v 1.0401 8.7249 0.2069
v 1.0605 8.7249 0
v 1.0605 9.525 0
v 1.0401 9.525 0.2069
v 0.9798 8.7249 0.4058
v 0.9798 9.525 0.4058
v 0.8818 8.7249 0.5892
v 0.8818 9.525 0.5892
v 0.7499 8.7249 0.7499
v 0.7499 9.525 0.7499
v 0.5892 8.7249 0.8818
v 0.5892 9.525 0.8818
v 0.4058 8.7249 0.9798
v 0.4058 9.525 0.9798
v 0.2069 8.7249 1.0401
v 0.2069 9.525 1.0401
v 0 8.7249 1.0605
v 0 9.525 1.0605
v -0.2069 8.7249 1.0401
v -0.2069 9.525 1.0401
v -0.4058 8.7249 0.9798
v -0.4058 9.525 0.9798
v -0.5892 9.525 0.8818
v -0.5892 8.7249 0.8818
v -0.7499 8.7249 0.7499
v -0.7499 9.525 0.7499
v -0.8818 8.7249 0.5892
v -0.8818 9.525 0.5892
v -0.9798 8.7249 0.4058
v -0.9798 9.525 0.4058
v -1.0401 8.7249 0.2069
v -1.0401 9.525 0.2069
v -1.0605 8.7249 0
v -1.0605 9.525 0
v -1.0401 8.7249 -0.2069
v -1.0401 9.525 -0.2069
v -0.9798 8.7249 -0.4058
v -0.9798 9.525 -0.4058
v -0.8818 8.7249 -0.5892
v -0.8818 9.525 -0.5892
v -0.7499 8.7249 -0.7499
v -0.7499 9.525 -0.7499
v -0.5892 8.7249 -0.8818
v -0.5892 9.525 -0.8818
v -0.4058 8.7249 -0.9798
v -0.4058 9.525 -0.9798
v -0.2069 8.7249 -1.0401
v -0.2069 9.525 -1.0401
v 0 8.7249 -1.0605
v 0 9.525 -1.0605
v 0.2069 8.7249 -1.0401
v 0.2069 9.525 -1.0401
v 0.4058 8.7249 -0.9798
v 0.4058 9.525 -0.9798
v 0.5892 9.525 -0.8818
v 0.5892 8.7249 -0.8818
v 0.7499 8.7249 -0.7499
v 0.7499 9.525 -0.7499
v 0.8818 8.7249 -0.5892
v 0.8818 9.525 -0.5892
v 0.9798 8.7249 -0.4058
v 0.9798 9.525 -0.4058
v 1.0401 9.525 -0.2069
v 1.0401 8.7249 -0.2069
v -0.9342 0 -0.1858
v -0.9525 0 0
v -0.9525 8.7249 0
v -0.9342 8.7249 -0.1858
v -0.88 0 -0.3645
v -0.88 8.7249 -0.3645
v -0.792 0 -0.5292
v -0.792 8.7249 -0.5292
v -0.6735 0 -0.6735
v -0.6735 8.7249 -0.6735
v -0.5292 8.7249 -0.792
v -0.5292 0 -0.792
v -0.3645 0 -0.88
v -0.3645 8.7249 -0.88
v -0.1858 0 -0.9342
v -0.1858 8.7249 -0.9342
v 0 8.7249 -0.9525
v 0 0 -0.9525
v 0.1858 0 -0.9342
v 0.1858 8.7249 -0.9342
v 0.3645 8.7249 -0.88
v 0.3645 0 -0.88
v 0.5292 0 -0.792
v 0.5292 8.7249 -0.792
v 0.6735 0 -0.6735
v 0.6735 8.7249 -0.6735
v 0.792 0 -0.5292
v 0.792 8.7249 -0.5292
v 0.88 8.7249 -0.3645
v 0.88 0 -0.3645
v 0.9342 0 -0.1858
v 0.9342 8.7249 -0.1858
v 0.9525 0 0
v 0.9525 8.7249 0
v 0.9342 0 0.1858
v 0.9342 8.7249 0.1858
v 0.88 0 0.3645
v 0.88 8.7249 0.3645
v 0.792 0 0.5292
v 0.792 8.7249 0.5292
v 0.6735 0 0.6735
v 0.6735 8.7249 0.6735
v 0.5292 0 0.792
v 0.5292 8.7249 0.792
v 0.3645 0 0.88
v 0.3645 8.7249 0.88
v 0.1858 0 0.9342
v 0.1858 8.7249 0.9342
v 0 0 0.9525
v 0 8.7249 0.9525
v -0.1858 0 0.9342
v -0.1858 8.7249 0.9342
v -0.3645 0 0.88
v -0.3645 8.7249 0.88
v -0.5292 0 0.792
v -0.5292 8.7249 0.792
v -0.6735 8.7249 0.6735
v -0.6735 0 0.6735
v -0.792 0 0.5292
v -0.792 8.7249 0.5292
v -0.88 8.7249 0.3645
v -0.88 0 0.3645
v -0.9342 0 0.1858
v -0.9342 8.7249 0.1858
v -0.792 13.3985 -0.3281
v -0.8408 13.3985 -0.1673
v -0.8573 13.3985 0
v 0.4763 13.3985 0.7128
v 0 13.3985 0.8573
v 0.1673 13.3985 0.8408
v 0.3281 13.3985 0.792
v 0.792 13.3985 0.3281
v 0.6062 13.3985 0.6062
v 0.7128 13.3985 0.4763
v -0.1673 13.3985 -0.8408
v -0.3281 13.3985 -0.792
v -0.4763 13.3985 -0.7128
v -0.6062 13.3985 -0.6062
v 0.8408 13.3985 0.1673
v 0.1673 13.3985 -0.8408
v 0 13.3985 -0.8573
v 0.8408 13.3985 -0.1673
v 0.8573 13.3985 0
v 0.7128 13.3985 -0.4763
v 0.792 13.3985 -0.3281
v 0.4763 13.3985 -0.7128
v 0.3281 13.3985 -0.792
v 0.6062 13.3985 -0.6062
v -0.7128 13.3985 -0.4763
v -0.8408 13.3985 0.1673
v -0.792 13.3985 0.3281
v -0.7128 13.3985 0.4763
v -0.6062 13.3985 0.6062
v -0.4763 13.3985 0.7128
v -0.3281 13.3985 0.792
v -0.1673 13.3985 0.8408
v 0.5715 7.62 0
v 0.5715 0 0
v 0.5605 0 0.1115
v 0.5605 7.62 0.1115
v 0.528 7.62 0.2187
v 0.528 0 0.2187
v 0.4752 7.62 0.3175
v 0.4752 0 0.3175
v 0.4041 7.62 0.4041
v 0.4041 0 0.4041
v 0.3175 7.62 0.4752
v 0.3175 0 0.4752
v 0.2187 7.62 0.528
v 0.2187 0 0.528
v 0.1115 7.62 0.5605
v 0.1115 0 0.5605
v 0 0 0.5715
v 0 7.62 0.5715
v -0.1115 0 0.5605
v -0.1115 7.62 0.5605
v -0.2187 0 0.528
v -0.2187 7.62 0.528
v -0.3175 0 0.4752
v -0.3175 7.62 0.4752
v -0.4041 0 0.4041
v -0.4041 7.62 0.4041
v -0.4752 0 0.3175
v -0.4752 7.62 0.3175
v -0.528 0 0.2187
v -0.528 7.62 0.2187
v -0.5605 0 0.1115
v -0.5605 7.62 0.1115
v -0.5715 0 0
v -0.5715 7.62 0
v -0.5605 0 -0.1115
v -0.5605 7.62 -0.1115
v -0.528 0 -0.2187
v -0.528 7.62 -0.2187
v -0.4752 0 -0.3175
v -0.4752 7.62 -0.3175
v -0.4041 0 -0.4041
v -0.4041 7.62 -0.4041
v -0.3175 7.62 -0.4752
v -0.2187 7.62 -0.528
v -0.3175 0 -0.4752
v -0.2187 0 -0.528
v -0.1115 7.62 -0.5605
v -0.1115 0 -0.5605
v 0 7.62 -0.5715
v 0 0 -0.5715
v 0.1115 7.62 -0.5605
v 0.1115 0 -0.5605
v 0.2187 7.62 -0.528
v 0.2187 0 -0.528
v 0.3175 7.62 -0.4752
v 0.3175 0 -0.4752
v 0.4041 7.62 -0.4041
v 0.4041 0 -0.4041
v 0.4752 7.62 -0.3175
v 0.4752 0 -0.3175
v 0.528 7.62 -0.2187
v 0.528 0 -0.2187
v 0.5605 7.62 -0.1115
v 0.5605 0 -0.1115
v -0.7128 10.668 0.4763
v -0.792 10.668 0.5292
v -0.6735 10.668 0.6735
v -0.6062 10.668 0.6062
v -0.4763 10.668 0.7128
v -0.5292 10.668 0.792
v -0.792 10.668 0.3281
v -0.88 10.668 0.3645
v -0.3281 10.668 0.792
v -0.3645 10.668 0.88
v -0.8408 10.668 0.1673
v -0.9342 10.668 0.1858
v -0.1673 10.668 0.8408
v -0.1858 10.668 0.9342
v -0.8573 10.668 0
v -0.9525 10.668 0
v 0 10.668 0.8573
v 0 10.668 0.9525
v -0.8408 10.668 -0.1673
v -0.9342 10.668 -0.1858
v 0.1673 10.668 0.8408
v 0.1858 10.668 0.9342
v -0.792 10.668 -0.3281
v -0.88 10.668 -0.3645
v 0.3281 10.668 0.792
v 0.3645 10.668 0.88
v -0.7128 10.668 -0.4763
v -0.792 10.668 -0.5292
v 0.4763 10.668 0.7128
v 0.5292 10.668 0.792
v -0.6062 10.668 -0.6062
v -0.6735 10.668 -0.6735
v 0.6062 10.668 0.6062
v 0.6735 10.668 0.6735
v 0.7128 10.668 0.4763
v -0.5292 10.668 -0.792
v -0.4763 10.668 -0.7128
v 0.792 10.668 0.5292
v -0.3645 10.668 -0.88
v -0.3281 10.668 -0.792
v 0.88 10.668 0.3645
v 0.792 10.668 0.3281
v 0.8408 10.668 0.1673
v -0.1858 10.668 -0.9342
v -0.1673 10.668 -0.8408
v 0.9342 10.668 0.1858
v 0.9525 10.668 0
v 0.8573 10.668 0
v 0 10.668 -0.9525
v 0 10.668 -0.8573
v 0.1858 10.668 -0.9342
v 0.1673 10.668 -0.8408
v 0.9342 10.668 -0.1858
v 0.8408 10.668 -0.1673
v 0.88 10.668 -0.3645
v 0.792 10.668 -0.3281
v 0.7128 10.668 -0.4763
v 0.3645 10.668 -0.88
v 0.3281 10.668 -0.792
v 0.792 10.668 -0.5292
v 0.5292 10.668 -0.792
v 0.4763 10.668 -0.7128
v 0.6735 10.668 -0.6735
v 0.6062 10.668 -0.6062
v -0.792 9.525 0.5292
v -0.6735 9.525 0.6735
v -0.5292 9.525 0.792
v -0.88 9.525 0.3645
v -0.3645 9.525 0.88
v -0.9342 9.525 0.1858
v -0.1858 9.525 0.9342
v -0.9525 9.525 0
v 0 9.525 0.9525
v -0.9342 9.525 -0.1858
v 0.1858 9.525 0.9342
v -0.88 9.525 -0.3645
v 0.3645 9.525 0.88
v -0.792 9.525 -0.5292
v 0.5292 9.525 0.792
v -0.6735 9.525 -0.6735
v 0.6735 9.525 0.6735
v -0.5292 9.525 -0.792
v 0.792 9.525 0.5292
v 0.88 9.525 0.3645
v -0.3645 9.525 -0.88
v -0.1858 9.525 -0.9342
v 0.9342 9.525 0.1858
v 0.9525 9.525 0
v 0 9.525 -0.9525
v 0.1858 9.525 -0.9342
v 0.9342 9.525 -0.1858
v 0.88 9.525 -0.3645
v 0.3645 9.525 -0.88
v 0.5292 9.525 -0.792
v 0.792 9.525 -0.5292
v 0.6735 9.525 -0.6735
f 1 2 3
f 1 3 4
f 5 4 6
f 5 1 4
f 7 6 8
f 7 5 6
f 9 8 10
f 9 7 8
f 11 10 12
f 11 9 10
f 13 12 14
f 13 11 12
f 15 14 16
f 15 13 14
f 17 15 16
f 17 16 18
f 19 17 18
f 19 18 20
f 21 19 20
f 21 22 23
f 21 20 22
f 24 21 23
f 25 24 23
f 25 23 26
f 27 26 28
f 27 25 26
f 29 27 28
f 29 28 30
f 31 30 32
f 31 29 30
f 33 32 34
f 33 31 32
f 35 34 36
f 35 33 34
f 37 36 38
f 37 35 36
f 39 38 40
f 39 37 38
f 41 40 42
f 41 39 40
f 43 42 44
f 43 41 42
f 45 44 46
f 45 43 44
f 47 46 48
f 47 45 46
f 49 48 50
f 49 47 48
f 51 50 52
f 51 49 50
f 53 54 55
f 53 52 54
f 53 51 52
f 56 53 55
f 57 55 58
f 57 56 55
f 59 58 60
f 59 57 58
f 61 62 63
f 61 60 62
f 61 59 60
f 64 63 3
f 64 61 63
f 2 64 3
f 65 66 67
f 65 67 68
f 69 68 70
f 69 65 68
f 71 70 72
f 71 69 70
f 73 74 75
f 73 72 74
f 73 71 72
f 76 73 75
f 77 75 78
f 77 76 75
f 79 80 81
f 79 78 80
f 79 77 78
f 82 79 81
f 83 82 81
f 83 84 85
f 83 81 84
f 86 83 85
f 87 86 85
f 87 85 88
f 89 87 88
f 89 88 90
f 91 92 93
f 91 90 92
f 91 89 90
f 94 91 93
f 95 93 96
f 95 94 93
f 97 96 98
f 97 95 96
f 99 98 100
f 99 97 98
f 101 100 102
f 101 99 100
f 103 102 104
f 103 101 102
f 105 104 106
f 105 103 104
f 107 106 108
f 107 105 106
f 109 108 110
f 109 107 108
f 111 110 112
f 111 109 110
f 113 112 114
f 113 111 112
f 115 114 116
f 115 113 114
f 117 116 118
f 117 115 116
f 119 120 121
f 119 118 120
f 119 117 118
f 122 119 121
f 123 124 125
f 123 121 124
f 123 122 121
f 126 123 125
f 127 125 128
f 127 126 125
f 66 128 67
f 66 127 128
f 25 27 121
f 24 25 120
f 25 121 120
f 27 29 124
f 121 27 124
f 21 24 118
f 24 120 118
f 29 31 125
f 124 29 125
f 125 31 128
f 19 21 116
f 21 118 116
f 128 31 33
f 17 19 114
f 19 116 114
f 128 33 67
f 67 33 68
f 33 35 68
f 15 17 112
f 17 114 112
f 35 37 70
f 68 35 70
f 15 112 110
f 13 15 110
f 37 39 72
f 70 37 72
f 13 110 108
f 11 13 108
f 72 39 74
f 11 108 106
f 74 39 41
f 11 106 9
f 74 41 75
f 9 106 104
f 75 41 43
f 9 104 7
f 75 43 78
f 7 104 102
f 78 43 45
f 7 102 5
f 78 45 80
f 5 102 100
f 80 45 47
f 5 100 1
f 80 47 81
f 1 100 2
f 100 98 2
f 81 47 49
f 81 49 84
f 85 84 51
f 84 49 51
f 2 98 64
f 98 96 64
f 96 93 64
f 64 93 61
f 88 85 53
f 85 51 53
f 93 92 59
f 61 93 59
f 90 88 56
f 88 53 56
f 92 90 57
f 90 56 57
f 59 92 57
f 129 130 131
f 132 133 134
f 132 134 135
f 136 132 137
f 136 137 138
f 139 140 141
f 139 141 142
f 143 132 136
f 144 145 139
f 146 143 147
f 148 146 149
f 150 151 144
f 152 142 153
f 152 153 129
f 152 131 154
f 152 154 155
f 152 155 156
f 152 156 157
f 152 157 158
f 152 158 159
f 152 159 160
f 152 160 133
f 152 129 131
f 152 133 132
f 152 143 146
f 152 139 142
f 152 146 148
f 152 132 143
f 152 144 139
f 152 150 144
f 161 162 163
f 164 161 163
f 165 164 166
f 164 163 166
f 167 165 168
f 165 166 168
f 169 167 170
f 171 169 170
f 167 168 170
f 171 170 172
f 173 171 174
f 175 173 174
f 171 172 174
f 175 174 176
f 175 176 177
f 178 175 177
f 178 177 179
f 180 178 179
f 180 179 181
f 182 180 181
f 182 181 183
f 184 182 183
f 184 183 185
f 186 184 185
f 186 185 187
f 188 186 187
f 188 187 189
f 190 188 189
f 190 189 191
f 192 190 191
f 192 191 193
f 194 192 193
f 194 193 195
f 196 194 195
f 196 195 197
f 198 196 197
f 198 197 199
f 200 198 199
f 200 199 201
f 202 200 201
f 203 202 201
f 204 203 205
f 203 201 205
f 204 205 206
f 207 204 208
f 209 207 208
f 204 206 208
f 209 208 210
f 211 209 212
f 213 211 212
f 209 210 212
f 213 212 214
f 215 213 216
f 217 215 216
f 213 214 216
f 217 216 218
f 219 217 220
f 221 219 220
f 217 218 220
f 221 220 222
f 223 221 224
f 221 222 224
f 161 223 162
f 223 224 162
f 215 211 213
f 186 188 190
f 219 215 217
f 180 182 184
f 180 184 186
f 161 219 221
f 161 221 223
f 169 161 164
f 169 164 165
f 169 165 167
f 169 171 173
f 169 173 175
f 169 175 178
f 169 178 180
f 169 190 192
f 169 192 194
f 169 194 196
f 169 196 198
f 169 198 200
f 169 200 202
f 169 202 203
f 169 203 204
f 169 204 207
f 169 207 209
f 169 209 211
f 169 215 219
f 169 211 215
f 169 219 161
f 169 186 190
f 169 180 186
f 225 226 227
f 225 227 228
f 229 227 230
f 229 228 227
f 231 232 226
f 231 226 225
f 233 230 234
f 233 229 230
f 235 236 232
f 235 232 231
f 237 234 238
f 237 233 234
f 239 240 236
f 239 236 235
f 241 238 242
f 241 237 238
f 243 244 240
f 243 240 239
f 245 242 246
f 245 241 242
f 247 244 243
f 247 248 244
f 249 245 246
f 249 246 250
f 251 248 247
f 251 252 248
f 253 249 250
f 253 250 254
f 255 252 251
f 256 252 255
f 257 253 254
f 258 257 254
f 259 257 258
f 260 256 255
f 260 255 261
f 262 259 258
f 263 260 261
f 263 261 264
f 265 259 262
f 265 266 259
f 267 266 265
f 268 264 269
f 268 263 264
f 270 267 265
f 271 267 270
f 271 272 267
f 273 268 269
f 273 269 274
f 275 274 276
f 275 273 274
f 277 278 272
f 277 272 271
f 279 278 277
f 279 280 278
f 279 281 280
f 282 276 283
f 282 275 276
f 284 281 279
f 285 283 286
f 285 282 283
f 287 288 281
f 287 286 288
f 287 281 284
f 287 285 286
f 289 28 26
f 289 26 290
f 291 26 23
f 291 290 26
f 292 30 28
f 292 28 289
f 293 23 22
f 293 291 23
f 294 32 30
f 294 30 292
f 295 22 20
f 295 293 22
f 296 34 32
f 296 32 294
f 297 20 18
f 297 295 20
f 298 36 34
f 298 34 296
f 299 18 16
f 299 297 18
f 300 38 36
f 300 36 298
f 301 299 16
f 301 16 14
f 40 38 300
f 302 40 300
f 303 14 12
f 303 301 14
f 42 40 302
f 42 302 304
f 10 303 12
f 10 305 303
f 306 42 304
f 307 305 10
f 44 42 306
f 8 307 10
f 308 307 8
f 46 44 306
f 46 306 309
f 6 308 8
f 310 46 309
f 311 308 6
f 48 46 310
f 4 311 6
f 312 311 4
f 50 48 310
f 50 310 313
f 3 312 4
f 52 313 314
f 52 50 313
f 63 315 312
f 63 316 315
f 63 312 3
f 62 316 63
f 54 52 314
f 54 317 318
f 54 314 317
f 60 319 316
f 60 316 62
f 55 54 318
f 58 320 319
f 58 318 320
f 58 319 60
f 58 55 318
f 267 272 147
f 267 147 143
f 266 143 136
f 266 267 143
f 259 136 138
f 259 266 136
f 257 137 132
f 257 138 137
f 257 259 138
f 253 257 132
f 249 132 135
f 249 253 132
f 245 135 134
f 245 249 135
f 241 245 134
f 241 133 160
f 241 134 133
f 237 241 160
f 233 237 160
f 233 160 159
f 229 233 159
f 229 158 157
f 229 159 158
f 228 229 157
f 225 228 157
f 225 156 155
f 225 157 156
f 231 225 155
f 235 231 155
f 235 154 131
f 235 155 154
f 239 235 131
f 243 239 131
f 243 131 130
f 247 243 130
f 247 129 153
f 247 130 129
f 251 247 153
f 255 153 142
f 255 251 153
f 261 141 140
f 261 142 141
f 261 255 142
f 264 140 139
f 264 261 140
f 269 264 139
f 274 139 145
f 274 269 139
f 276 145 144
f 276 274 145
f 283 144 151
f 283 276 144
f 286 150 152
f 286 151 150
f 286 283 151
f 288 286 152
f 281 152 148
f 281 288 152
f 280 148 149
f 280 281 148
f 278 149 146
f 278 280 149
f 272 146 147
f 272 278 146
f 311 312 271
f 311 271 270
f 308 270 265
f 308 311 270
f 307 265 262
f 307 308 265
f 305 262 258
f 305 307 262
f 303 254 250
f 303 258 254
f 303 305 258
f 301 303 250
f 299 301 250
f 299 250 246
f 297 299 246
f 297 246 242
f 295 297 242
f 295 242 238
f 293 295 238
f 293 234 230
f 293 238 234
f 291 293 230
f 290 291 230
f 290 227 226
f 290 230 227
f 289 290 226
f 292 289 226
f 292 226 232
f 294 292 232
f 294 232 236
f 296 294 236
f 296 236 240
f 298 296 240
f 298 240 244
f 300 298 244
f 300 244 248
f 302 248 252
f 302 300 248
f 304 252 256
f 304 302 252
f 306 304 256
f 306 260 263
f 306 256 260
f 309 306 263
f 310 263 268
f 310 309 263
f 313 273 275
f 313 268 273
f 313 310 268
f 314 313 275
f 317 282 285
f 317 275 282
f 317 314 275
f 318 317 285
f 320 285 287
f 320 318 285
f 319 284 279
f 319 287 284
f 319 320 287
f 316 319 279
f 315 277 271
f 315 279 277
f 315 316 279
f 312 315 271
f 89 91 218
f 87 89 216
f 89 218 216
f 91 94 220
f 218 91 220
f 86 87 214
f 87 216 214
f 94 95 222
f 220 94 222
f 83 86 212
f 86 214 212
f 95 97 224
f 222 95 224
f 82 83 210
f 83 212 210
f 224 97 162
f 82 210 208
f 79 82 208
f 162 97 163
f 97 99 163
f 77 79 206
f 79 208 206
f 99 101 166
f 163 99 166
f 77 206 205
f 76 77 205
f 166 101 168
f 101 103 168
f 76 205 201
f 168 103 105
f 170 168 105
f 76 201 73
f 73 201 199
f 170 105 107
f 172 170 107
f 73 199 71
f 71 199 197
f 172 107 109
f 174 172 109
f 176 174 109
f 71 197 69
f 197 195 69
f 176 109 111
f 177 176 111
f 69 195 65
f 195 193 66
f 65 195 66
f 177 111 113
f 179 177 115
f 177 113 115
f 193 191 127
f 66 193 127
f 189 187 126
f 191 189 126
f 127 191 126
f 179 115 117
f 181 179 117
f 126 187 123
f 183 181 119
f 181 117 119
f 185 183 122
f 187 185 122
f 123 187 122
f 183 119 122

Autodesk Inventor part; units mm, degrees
ref_plane "YZ Plane" through (0, 0, 0) normal (1, 0, 0) x (0, 1, 0)
ref_plane "XZ Plane" through (0, 0, 0) normal (0, 1, 0) x (-1, 0, 0)
ref_plane "XY Plane" through (0, 0, 0) normal (0, 0, 1) x (1, 0, 0)
sketch "Sketch1" plane through (0, 0, 0) normal (0, 1, 0) x (-1, 0, 0)
  circle A0 centre (0, 0) radius 0.9525
  dimension "d0" = 1.905
extrude "Extrusion1" add sketch "Sketch1" along normal blind 8.7249
sketch "Sketch2" plane through (0, 8.7249, 0) normal (0, 1, 0) x (1, 0, 0)
  circle A0 centre (0, 0) radius 0.9525 projected
  circle A1 centre (0, 0) radius 1.0605
  dimension "d3" = 2.1209
extrude "Extrusion2" add sketch "Sketch2" along normal blind 0.8001 contours A0 | A1
sketch "Sketch3" plane through (0, 9.525, 0) normal (0, 1, 0) x (1, 0, 0)
  circle A0 centre (0, 0) radius 1.0605 projected
  circle A1 centre (0, 0) radius 0.9525 projected
  circle A2 centre (0, 0) radius 0.8827
  dimension "d6" = 1.7653
extrude "Extrusion3" add sketch "Sketch3" along normal blind 1.143 contours A1 | A2
sketch "Sketch4" plane through (0, 10.668, 0) normal (0, 1, 0) x (1, 0, 0)
  circle A0 centre (0, 0) radius 0.9525 projected
  circle A1 centre (0, 0) radius 0.8573
  dimension "d9" = 1.7145
extrude "Extrusion4" add sketch "Sketch4" along normal blind 2.7305 contours A1
sketch "Sketch5" plane through (0, 0, 0) normal (0, -1, 0) x (1, 0, 0)
  circle A0 centre (0, 0) radius 0.9525 projected
  circle A1 centre (0, 0) radius 0.5715
  dimension "d12" = 1.143
extrude "Extrusion5" cut sketch "Sketch5" against normal blind 7.62 contours A1
properties part number "female_pin_component"
